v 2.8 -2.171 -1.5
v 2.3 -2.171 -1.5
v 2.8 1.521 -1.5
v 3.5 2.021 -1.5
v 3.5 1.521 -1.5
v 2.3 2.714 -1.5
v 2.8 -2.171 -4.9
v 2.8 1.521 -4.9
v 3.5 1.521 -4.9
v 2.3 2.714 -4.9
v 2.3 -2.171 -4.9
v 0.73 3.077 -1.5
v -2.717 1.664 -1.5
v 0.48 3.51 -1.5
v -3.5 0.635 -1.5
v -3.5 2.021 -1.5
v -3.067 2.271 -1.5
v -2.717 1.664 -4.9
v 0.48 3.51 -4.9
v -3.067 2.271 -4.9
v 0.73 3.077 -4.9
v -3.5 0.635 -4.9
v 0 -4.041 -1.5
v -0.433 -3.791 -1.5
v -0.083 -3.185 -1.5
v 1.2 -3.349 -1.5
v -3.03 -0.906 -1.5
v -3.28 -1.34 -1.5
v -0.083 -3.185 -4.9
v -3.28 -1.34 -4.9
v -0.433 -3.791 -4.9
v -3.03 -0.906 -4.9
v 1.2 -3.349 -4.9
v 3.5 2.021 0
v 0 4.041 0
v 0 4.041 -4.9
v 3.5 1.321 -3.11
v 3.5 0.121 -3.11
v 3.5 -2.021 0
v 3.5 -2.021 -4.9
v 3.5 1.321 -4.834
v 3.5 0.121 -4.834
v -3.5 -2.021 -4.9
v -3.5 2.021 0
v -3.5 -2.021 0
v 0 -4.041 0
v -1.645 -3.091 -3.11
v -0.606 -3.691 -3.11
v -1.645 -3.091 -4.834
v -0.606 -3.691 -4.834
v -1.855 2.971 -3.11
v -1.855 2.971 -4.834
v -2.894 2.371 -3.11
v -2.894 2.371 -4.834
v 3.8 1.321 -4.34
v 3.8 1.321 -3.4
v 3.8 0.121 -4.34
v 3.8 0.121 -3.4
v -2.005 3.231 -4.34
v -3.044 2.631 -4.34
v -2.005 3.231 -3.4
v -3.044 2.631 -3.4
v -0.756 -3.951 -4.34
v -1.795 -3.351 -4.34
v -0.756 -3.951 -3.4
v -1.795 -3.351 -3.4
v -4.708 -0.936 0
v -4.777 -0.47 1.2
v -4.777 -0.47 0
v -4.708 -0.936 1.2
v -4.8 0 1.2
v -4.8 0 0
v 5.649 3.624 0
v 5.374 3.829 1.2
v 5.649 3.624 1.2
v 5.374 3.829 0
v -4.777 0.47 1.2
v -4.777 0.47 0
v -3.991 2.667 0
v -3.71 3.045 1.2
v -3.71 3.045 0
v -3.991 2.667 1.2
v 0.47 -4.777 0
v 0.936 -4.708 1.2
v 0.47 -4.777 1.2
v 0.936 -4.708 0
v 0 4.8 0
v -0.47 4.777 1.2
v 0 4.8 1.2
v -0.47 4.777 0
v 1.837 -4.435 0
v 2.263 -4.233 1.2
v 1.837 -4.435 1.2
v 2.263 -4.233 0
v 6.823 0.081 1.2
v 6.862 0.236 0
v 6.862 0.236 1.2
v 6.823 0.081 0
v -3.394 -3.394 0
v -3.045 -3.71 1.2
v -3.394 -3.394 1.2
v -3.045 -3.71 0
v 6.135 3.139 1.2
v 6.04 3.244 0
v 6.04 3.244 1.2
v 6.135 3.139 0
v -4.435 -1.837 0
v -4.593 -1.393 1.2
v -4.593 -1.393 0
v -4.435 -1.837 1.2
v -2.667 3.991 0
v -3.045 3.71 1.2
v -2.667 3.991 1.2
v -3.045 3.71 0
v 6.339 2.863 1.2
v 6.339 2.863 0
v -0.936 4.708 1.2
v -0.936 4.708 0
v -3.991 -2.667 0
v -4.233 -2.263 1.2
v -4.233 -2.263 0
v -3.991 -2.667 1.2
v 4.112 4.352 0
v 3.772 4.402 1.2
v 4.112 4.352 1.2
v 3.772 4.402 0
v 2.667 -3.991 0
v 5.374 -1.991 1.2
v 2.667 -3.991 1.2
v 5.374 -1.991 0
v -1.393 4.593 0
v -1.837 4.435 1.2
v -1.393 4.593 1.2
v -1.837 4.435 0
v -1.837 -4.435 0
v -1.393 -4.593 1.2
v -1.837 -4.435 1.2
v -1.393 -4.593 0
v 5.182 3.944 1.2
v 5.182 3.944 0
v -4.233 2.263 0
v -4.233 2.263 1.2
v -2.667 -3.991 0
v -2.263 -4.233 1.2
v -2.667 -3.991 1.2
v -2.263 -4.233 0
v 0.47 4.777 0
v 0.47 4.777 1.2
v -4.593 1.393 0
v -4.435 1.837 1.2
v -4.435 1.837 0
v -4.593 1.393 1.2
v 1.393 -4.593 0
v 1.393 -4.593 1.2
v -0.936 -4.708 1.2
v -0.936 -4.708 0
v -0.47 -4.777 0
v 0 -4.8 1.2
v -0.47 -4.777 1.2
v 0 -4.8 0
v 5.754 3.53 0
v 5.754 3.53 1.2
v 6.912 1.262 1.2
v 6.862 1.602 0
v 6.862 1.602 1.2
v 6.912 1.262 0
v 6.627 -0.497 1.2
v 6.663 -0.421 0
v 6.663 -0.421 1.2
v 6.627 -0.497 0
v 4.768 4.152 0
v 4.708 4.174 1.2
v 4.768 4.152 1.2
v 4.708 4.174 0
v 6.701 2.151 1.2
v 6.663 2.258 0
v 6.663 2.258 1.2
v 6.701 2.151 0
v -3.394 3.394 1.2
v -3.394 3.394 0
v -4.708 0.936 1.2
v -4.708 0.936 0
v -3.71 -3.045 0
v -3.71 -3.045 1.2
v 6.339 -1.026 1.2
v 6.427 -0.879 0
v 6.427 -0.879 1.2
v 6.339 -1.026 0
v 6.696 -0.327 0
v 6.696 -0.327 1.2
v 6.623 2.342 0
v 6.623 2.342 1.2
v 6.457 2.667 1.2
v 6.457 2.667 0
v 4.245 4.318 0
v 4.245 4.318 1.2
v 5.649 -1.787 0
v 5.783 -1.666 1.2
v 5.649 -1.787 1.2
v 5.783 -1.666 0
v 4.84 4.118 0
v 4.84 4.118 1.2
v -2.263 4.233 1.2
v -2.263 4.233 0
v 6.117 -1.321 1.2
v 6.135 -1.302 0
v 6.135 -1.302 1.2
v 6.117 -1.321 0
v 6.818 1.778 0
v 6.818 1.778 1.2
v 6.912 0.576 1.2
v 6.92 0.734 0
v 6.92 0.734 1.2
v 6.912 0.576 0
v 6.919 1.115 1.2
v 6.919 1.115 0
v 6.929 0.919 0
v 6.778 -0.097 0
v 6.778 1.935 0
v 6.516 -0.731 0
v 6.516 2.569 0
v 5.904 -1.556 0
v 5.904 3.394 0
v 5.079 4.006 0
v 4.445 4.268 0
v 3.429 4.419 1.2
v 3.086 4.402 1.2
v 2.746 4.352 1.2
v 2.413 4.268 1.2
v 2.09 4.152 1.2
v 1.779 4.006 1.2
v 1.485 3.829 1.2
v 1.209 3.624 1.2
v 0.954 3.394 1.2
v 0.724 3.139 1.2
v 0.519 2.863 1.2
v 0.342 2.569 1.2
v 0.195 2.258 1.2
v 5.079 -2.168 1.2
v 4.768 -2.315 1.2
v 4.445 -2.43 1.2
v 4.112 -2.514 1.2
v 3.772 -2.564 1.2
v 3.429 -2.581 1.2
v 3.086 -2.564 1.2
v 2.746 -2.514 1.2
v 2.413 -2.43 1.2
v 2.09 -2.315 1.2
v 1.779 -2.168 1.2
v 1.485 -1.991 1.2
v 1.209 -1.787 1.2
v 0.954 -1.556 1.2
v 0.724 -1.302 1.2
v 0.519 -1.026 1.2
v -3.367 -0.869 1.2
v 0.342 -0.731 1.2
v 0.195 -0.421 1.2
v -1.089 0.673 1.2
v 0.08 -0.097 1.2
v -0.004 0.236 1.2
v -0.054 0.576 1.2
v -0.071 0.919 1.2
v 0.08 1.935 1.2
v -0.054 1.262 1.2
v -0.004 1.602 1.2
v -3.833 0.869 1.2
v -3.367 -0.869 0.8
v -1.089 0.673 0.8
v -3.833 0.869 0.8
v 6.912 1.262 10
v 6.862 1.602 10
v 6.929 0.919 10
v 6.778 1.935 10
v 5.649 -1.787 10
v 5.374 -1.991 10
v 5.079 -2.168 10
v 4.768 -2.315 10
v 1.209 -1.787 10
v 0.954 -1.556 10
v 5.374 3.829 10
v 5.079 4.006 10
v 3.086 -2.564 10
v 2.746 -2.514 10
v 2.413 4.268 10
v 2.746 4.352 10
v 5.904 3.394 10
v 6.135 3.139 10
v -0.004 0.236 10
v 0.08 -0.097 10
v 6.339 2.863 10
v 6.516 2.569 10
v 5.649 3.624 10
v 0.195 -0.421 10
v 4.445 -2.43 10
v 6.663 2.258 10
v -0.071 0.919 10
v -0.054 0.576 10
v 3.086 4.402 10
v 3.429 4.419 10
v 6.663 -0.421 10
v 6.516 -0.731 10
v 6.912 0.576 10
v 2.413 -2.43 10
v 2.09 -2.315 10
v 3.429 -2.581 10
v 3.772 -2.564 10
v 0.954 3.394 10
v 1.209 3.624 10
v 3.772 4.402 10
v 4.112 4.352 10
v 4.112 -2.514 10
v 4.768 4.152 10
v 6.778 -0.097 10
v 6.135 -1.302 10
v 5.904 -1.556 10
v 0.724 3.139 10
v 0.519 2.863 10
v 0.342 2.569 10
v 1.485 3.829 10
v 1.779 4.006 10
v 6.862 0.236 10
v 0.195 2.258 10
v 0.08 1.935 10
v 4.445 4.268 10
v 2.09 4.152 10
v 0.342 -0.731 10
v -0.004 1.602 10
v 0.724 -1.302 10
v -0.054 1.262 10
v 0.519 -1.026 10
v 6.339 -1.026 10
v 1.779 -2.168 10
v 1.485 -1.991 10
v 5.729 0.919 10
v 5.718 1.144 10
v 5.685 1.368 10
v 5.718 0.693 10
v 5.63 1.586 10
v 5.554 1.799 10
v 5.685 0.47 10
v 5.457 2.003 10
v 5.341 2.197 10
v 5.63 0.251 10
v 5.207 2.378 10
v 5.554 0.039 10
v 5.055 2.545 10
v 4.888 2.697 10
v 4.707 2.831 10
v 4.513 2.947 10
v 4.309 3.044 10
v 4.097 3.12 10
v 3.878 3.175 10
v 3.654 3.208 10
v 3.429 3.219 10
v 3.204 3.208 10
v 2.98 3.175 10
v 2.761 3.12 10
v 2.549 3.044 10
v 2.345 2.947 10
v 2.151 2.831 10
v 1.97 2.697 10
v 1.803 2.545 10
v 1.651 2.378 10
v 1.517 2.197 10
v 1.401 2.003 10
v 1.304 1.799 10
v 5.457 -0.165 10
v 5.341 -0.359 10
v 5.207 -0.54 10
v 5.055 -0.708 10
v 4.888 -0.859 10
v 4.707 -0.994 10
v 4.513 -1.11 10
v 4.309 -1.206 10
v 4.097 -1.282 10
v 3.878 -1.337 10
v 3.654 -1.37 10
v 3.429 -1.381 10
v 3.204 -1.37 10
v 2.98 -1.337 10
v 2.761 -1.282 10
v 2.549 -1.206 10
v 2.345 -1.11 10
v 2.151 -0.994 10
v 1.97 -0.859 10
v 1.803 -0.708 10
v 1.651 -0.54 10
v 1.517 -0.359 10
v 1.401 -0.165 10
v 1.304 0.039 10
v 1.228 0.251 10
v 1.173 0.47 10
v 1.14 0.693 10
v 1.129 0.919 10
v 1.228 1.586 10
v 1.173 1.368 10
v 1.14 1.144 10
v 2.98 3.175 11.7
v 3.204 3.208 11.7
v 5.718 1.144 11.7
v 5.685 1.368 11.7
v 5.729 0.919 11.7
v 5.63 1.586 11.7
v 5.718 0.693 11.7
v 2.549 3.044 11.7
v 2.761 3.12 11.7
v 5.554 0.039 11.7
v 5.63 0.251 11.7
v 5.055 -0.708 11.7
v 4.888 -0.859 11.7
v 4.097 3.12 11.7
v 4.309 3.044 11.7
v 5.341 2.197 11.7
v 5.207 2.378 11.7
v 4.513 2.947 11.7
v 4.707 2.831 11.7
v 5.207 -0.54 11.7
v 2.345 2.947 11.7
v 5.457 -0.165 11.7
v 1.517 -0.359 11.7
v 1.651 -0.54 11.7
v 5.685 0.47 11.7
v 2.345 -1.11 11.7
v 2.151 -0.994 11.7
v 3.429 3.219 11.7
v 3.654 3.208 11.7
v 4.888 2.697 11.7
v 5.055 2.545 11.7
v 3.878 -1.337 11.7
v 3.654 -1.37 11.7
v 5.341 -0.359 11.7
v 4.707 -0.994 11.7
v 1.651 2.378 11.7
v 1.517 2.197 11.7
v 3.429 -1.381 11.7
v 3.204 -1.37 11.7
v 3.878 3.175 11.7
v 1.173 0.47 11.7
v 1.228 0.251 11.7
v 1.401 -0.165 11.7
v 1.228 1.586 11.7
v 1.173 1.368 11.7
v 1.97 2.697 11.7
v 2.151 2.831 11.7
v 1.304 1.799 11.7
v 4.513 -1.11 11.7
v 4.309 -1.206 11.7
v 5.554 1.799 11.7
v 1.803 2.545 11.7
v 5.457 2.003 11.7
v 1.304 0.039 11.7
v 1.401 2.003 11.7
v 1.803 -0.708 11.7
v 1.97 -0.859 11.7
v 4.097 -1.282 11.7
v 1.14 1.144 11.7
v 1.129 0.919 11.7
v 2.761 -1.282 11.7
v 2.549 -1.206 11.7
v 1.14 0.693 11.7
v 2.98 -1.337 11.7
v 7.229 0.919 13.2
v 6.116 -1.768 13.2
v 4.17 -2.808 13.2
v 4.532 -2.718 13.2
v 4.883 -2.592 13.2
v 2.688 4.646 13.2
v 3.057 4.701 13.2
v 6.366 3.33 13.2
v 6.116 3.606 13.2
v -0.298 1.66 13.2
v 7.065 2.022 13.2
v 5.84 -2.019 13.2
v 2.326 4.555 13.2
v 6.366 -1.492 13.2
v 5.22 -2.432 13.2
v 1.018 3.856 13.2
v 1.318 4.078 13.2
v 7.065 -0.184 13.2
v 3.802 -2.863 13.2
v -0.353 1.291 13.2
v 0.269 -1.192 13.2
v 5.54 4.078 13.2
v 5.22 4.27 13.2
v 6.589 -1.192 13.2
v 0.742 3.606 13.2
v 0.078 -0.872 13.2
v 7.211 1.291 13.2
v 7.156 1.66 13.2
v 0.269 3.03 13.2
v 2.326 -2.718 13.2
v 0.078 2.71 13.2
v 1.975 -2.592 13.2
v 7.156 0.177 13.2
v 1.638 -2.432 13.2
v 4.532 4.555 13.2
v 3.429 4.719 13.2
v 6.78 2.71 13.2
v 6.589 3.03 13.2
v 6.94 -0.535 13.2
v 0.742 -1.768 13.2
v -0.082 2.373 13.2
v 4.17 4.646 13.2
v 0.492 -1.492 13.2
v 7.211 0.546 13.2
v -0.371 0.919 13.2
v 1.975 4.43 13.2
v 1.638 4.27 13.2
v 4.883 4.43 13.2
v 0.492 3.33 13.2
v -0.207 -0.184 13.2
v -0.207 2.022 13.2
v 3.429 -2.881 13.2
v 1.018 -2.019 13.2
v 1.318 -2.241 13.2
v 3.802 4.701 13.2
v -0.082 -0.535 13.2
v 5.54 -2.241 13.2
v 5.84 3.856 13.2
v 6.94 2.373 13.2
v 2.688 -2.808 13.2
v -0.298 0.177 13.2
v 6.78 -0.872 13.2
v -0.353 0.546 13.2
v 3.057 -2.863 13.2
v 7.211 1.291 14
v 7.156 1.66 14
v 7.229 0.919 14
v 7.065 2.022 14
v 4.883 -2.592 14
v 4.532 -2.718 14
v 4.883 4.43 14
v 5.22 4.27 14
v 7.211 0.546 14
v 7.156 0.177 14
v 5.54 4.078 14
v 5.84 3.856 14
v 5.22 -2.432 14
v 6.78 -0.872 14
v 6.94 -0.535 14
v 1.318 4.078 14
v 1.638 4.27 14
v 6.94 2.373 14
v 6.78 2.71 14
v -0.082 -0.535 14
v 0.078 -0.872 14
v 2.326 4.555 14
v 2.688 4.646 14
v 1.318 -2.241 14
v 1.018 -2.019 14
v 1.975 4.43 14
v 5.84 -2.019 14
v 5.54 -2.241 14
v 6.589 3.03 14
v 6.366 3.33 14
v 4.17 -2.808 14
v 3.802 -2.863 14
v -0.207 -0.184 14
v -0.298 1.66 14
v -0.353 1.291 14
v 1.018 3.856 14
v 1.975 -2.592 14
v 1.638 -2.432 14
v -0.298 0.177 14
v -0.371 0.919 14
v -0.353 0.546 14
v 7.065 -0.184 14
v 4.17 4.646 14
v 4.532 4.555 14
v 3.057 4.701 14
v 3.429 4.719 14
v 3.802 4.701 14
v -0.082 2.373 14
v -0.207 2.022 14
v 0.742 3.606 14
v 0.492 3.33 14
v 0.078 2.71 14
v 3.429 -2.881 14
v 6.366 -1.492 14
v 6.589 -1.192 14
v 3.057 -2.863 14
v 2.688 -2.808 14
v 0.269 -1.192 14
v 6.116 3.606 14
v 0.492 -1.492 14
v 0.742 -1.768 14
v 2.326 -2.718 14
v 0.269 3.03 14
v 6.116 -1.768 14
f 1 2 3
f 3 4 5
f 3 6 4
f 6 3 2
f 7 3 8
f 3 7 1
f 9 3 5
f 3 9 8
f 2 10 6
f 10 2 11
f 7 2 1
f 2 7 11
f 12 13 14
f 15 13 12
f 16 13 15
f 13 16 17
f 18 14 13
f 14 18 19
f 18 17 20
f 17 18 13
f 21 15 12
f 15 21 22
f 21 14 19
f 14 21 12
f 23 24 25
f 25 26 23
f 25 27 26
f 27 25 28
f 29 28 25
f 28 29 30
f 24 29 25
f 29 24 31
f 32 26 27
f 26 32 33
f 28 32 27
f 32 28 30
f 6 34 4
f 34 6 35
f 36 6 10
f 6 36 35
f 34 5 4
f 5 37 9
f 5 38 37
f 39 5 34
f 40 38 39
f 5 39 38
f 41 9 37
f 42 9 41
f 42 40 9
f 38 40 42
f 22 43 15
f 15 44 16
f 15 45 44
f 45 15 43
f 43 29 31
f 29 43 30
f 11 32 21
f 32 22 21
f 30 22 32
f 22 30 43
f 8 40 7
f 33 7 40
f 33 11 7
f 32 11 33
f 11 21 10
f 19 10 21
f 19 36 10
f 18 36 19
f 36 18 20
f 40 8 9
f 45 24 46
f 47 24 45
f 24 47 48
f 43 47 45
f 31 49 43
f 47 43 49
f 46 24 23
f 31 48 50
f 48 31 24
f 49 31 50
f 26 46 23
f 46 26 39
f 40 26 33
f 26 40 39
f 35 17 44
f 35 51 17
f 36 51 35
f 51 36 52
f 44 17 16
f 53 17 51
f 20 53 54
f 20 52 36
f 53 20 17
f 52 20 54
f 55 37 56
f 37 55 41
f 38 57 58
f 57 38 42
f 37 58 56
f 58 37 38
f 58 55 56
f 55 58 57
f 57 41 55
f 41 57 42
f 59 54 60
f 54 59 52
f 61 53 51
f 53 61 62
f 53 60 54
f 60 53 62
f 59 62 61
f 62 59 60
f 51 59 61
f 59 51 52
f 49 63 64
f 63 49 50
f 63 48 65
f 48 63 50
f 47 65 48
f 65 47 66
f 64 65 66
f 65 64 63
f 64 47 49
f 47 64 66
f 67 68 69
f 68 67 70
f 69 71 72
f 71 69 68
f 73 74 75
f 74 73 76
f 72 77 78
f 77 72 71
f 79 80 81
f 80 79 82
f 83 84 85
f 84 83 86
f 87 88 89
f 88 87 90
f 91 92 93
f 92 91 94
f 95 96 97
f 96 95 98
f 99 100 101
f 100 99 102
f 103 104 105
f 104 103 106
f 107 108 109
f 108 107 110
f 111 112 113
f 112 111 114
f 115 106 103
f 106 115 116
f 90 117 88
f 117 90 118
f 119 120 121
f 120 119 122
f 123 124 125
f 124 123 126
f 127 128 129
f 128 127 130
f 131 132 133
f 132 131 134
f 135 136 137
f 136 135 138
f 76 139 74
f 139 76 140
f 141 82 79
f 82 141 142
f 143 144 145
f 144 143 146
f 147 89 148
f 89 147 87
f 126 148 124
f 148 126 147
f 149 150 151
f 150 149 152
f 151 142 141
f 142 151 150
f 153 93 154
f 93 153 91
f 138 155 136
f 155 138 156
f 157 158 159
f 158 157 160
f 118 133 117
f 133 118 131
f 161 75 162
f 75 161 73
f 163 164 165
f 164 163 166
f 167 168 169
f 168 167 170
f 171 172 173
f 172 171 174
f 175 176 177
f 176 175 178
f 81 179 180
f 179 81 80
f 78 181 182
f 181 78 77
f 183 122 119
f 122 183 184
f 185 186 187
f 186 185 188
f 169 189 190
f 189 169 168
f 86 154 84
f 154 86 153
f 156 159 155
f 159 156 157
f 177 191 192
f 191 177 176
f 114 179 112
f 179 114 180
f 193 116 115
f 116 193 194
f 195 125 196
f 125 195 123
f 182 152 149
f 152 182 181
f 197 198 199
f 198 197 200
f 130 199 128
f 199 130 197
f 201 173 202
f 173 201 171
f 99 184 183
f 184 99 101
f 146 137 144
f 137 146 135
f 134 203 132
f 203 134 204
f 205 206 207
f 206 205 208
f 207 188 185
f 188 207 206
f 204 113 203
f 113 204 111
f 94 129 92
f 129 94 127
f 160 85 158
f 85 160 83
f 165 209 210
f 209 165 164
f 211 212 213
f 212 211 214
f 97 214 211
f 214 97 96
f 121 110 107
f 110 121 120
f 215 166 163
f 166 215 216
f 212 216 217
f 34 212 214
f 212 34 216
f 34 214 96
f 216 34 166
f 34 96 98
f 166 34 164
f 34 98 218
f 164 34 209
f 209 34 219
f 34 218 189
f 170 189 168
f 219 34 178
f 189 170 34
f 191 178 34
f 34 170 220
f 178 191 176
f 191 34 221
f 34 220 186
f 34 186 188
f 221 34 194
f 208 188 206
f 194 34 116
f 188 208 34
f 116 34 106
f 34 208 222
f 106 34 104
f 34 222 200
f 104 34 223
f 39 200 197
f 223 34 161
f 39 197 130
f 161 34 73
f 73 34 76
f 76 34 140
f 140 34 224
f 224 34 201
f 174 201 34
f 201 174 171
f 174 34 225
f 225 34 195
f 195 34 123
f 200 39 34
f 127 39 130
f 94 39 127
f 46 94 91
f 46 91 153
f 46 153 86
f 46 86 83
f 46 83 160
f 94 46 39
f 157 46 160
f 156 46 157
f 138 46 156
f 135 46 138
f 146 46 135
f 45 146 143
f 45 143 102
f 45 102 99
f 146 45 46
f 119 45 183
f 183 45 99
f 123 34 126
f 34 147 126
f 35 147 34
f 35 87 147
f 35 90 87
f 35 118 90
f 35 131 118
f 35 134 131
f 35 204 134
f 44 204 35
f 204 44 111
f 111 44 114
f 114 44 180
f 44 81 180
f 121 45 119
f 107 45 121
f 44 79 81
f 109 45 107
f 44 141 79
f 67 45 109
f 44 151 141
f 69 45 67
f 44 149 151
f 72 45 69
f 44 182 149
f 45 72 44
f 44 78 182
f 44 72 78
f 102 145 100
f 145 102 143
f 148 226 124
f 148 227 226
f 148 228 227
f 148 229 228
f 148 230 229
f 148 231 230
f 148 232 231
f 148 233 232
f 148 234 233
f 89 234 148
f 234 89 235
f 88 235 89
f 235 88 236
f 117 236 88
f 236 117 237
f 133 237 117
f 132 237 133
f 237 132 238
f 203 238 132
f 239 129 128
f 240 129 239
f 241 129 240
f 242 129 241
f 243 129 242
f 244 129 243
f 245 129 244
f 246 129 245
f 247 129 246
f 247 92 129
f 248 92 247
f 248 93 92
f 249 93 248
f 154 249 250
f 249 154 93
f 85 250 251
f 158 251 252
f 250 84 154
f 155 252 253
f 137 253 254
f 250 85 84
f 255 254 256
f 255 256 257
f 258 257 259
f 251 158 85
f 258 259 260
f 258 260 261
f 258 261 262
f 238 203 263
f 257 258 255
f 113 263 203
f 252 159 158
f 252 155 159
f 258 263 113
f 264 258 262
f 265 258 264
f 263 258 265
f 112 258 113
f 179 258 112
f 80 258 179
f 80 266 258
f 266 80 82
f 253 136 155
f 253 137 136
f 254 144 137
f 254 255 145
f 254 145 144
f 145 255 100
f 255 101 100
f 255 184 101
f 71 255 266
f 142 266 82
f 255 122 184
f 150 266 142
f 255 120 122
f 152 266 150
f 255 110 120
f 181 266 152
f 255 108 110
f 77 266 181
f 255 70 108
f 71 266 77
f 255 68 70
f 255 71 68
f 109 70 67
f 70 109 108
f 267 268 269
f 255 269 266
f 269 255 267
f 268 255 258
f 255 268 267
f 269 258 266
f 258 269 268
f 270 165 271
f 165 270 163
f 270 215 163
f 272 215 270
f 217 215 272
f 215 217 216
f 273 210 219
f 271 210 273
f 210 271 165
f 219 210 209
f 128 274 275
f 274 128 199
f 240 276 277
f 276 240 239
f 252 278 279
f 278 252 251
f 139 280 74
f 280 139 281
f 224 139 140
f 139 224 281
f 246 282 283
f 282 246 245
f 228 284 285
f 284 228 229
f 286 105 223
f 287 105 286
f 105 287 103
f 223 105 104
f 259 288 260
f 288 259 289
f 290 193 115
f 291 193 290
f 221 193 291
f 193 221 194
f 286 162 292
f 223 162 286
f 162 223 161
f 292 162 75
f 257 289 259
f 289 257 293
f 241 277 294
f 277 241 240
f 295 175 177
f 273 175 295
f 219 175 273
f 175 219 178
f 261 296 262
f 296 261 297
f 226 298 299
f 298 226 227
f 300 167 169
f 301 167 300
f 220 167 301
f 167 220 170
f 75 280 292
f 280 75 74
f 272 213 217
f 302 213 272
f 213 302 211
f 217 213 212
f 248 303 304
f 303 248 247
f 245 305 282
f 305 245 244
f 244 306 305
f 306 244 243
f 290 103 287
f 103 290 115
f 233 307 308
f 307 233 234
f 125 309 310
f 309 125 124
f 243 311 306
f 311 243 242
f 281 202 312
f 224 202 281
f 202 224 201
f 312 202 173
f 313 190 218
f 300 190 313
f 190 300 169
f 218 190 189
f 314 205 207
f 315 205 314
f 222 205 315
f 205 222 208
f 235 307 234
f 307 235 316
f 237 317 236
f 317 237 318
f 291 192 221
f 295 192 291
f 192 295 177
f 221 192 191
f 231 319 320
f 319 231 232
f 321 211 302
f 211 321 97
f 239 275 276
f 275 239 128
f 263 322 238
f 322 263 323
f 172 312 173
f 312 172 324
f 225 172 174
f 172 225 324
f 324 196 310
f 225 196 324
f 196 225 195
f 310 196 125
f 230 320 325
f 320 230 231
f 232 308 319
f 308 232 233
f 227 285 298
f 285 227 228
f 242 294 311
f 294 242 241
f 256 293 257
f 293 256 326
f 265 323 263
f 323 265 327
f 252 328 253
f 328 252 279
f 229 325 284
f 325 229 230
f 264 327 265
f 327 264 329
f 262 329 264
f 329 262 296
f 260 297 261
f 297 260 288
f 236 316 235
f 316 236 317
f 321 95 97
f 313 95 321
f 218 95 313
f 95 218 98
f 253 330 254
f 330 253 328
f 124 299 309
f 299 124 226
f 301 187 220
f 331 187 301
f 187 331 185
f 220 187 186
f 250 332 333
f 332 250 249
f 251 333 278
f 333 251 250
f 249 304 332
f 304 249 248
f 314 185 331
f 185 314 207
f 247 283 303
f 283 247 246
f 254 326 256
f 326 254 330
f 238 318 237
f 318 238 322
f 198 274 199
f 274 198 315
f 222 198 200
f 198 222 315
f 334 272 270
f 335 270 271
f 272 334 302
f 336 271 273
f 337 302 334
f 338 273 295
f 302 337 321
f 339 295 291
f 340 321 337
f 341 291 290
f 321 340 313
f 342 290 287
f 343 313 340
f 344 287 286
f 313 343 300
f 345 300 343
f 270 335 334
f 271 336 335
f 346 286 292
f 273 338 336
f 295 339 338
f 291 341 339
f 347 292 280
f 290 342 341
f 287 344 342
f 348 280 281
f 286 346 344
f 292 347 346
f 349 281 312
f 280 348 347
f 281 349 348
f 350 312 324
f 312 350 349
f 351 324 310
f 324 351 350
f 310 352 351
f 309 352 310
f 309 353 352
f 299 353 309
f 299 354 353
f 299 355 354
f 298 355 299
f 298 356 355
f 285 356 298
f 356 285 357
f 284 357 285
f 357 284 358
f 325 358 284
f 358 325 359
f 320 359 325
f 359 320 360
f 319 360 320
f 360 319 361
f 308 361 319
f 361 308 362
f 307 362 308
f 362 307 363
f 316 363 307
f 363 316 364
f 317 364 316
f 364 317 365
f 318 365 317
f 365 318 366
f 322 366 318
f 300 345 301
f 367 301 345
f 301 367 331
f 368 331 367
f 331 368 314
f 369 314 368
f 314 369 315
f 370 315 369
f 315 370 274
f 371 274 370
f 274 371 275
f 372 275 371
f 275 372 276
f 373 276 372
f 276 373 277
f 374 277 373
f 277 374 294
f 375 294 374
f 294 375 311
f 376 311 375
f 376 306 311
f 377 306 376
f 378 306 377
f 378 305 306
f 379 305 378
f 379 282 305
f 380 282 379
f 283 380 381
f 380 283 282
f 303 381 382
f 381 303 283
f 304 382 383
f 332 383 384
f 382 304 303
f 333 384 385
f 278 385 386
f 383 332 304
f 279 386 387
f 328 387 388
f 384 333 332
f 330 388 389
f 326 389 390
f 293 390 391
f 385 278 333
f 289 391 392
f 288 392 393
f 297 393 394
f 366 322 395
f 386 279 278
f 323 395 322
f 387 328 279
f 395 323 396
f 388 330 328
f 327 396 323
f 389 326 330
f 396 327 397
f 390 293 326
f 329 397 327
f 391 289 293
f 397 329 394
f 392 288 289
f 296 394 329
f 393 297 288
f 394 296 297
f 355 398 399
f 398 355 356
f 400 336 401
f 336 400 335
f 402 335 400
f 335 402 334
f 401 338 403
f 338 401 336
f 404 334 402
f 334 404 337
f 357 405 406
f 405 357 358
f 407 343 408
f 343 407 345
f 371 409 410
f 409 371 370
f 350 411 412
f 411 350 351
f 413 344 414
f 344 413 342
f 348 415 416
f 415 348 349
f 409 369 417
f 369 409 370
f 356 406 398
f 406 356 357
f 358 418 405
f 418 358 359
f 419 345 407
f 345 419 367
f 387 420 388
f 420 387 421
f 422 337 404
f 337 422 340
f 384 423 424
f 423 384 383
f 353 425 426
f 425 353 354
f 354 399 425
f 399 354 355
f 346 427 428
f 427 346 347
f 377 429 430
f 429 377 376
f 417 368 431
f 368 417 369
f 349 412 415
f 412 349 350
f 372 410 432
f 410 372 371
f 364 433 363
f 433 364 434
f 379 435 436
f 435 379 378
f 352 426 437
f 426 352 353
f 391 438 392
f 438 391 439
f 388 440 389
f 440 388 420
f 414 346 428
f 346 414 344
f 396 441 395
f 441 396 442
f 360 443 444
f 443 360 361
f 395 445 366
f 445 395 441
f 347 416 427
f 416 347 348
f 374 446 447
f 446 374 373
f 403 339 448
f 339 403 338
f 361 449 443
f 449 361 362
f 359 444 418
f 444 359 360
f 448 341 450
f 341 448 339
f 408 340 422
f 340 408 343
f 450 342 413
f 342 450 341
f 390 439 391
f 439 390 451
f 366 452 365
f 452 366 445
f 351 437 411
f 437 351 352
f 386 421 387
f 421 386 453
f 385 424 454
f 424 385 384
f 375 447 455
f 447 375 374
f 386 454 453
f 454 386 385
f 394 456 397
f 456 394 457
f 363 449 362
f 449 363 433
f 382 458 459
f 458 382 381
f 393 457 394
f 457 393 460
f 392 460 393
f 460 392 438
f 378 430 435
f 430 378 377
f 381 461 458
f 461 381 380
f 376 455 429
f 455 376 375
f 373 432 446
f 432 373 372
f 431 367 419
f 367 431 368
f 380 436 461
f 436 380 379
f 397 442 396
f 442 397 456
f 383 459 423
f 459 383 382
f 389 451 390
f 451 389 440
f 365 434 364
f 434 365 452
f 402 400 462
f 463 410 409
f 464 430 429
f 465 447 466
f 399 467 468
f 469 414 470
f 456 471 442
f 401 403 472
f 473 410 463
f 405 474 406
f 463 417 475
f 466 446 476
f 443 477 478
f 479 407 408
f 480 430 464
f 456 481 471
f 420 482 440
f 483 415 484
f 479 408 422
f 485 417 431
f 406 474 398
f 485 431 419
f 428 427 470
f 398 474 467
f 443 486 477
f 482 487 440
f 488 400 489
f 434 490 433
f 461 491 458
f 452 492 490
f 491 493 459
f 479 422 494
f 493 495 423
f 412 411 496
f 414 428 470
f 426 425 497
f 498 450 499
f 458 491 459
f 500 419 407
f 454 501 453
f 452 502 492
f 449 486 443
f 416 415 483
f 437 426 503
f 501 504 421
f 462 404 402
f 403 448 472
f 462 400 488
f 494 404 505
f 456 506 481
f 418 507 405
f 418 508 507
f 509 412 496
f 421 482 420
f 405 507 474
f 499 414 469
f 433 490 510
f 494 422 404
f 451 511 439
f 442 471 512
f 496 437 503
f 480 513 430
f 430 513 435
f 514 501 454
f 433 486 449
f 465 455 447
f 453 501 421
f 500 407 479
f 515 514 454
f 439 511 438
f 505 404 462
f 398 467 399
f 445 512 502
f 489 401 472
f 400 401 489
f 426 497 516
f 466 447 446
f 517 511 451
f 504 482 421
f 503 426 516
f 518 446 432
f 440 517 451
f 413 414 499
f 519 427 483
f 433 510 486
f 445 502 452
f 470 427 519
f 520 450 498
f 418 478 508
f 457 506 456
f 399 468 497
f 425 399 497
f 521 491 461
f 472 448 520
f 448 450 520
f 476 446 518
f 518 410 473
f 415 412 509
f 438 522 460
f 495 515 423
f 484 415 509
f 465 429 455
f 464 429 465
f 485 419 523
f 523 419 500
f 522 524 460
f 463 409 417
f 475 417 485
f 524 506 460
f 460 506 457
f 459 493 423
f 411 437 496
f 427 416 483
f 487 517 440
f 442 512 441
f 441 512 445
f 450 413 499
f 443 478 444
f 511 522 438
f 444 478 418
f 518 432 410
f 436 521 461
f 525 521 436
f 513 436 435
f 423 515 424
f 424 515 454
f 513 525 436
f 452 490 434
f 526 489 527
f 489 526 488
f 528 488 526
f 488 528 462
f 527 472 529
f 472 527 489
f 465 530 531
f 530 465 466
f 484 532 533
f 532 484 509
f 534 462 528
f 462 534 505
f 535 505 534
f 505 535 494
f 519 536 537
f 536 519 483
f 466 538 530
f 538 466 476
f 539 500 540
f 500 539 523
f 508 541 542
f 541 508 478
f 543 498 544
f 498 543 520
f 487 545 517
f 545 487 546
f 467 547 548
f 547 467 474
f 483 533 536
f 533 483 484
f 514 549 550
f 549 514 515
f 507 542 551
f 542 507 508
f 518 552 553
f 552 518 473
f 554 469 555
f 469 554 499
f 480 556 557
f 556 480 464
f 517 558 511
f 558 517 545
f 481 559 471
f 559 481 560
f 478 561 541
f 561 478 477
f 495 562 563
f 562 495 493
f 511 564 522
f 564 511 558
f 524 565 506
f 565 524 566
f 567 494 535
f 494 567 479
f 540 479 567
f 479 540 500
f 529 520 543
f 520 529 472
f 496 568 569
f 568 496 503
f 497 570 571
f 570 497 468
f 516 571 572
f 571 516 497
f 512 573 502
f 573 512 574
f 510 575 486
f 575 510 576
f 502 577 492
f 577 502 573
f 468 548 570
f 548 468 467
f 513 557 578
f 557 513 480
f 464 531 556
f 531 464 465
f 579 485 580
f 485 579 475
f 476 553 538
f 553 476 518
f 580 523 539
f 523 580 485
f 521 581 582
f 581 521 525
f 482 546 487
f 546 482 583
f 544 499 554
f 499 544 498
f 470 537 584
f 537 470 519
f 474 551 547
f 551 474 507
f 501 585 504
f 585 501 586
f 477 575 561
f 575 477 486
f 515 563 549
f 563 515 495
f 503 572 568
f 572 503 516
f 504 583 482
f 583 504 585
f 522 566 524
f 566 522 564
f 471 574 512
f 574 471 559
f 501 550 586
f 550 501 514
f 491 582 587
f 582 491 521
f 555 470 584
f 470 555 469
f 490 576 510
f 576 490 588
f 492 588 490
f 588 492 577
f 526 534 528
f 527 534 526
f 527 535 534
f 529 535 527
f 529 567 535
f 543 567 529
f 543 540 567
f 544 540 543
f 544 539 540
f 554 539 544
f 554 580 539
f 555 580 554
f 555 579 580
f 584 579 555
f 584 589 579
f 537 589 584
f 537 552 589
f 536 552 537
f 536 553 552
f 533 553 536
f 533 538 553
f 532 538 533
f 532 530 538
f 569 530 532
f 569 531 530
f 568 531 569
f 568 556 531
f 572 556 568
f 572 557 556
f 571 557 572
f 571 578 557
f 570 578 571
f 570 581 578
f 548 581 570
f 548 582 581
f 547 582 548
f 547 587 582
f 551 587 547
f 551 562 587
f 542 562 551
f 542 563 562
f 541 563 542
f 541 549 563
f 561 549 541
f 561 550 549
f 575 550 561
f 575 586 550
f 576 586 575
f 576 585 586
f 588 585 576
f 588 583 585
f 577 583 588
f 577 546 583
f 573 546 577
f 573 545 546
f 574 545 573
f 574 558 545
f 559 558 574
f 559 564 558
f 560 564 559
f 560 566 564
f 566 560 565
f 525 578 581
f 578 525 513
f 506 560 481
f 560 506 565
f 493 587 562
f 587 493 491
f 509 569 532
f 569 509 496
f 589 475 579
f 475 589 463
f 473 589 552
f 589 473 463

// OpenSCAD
// file: ../generated/config.scad
// GENERATED by tools/build.py from config/rack.yaml — do not edit.

FRAME_W = 670.6;
FRAME_D = 225.335;
FRAME_TILT = 20;
FRAME_ROW_Y0 = 25;
FRAME_BASE_H = 80;
FRAME_TOP_Z = 410;
FRAME_PANEL_T = 7.4;
FRAME_PANEL_CLEAR = 0.2;
ROW_IDS = ["A", "B"];
ROW_HEIGHTS = [165, 165];
ROW_LAYOUTS = [[1, 1, 1, 1], [1, 1, 1, 1]];
BAY_PITCH = 165.8;
CARRIER_W = 158;
CARRIER_D = 210;
CARRIER_BOTTOM = 2.5;
CARRIER_WALL = 2;
CARRIER_STANDOFF = 5;
CARRIER_DECK = 3;
CARRIER_FASCIA = 2.5;
CARRIER_WALL_H = 20.1;
CARRIER_PLENUM = 23.1;
PCB_TO_FLOOR = 14;
CAM_MOUNT = [109, 45, 30];
CAM_LENS = [64, 27.6];
DRAWER_D = 208;
DRAWER_W = 142;
DRAWER_X0 = 8;
DRAWER_TRAVEL = 140;
DRAWER_GUIDE_W = 7.5;
DRAWER_CLEAR = 0.5;
DRAWER_BOTTOM = 2.5;
DRAWER_WALL = 2;
DRAWER_WALL_H = 16;
DRAWER_FRONT_H = 30;
DRAWER_FRONT_T = 4;
DRAWER_REAR_BAY = 42;
DRAWER_FLANGE = [3, 3];
DRAWER_MAGNET = [6, 3];
DATA_PORT_X = [80];
PLATE_T = 5;
HEX_PITCH = 10;
HEX_AF = 7.2;
HEX_U = 0.4;
HEX_CLEAR = 0.1;
HEX_HOLES = [[23.7, 10.418], [33.7, 10.418], [43.7, 10.418], [53.7, 10.418], [63.7, 10.418], [73.7, 10.418], [83.7, 10.418], [93.7, 10.418], [103.7, 10.418], [113.7, 10.418], [123.7, 10.418], [8.7, 19.078], [18.7, 19.078], [28.7, 19.078], [38.7, 19.078], [48.7, 19.078], [58.7, 19.078], [68.7, 19.078], [78.7, 19.078], [88.7, 19.078], [98.7, 19.078], [108.7, 19.078], [118.7, 19.078], [128.7, 19.078], [13.7, 27.738], [23.7, 27.738], [33.7, 27.738], [43.7, 27.738], [53.7, 27.738], [63.7, 27.738], [73.7, 27.738], [83.7, 27.738], [93.7, 27.738], [103.7, 27.738], [113.7, 27.738], [123.7, 27.738], [8.7, 36.399], [18.7, 36.399], [28.7, 36.399], [38.7, 36.399], [48.7, 36.399], [58.7, 36.399], [68.7, 36.399], [78.7, 36.399], [88.7, 36.399], [98.7, 36.399], [108.7, 36.399], [118.7, 36.399], [128.7, 36.399], [13.7, 45.059], [23.7, 45.059], [33.7, 45.059], [43.7, 45.059], [53.7, 45.059], [63.7, 45.059], [73.7, 45.059], [83.7, 45.059], [93.7, 45.059], [103.7, 45.059], [113.7, 45.059], [123.7, 45.059], [8.7, 53.719], [18.7, 53.719], [28.7, 53.719], [38.7, 53.719], [48.7, 53.719], [58.7, 53.719], [68.7, 53.719], [78.7, 53.719], [88.7, 53.719], [98.7, 53.719], [108.7, 53.719], [118.7, 53.719], [128.7, 53.719], [23.7, 62.379], [33.7, 62.379], [43.7, 62.379], [53.7, 62.379], [63.7, 62.379], [73.7, 62.379], [83.7, 62.379], [93.7, 62.379], [103.7, 62.379], [113.7, 62.379], [123.7, 62.379], [28.7, 71.04], [38.7, 71.04], [48.7, 71.04], [58.7, 71.04], [68.7, 71.04], [78.7, 71.04], [88.7, 71.04], [98.7, 71.04], [108.7, 71.04], [33.7, 79.7], [43.7, 79.7], [53.7, 79.7], [63.7, 79.7], [73.7, 79.7], [83.7, 79.7], [93.7, 79.7], [103.7, 79.7], [28.7, 88.36], [38.7, 88.36], [48.7, 88.36], [58.7, 88.36], [68.7, 88.36], [78.7, 88.36], [88.7, 88.36], [98.7, 88.36], [108.7, 88.36], [13.7, 97.021], [23.7, 97.021], [33.7, 97.021], [43.7, 97.021], [53.7, 97.021], [63.7, 97.021], [73.7, 97.021], [83.7, 97.021], [93.7, 97.021], [103.7, 97.021], [113.7, 97.021], [123.7, 97.021], [8.7, 105.681], [18.7, 105.681], [28.7, 105.681], [38.7, 105.681], [48.7, 105.681], [58.7, 105.681], [68.7, 105.681], [78.7, 105.681], [88.7, 105.681], [98.7, 105.681], [108.7, 105.681], [118.7, 105.681], [128.7, 105.681], [13.7, 114.341], [23.7, 114.341], [33.7, 114.341], [43.7, 114.341], [53.7, 114.341], [63.7, 114.341], [73.7, 114.341], [83.7, 114.341], [93.7, 114.341], [103.7, 114.341], [113.7, 114.341], [123.7, 114.341], [8.7, 123.001], [18.7, 123.001], [28.7, 123.001], [38.7, 123.001], [48.7, 123.001], [58.7, 123.001], [68.7, 123.001], [78.7, 123.001], [88.7, 123.001], [98.7, 123.001], [108.7, 123.001], [118.7, 123.001], [128.7, 123.001], [13.7, 131.662], [23.7, 131.662], [33.7, 131.662], [43.7, 131.662], [53.7, 131.662], [63.7, 131.662], [73.7, 131.662], [83.7, 131.662], [93.7, 131.662], [103.7, 131.662], [113.7, 131.662], [123.7, 131.662], [8.7, 140.322], [18.7, 140.322], [28.7, 140.322], [38.7, 140.322], [48.7, 140.322], [58.7, 140.322], [68.7, 140.322], [78.7, 140.322], [88.7, 140.322], [98.7, 140.322], [108.7, 140.322], [118.7, 140.322], [128.7, 140.322], [13.7, 148.982], [23.7, 148.982], [33.7, 148.982], [43.7, 148.982], [53.7, 148.982], [63.7, 148.982], [73.7, 148.982], [83.7, 148.982], [93.7, 148.982], [103.7, 148.982], [113.7, 148.982]];
HEX_ROWS = [[1, 10.418], [2, 19.078], [3, 27.738], [4, 36.399], [5, 45.059], [6, 53.719], [7, 62.379], [8, 71.04], [9, 79.7], [10, 88.36], [11, 97.021], [12, 105.681], [13, 114.341], [14, 123.001], [15, 131.662], [16, 140.322], [17, 148.982]];
PEG_STOP = [3.55, 15, 4.6, 7, 7.6];
PEG_CAM = [3, 6.75, 270, 20];
CHAIN_INNER = [7, 7];
CHAIN_OUTER = [13.5, 10.2];
CHAIN_R = 18;
CHAIN_PITCH = 16;
CHAIN_END_HOLES = [8, 4];
CHAIN_FIXED = [100, 87];
CHAIN_MOVING_X = 136;
CHAIN_FOOT_Y = 172;
CHAIN_MOVING_Y = 157;
CHAIN_END_LENGTH = 26;
CHAIN_BEND_Y = 183;
NODE_SIZE = [74, 90];
NODE_T = 1.6;
NODE_HOLES = [[3.5, 13.5], [70.5, 13.5], [3.5, 86.5], [70.5, 86.5]];
NODE_X0 = 4;
NODE_FRONT_Y = 3;
NODE_PCB_TOP = 9.1;
NODE_FRONT = [32, 12, 50];
NODE_PWR_Y = 73;
NODE_DATA_Y = 30;
NODE_AUX = [69.1, 50.6];
NODE_CAM = [59, 17.2];
DATA_PCB_SIZE = [40, 17];
DATA_PCB_T = 1.6;
DATA_PCB_HOLES = [[2.6, 13.5], [37.5, 4]];
DATA_PCB_USB = 30.5;
DATA_PCB_PH = 14.4;
DATA_X4_SIZE = [100, 37];
DATA_X4_X0 = 15;
DATA_X4_HOLES = [[3.2, 16.5], [38.7, 16.5], [81.4, 16.3]];
DATA_X4_USB = [11, 29, 47, 65];
DATA_X4_LEAD = [95.1, 20];
POD_PCB_SIZE = [40, 27];
POD_PCB_T = 1.6;
POD_PCB_HOLES = [[2.6, 13], [26.5, 23.5]];
POD_LEDS = [5, 11, 17, 23];
POD_LED_Y = 3.2;
POD_LEAD_Y = 13;
POD_HEADER = [13, 21];
HUB_SIZE = [76, 100];
HUB_HOLES = [[3.5, 3.5], [72, 4], [4, 93.5], [72, 86]];
HUB_T = 1.6;
HUB_X0 = 3.6;
HUB_FRONT_GAP = 1.2;
HUB_Z = 19;
HUB_ROWS = [81, 63.5, 46, 28.5];
HUB_LEDS = [11, 23, 35, 47, 55.6, 61.6];
HUB_USB = 70;
HUB_PD = 62;
HUB_BUTTONS = [[11.5, 10], [11.5, 16.5]];
PBOX_COLUMN = 0;
PBOX_SIZE = [84, 108, 35];
PBOX_WALL = 2.4;
PBOX_X = 3;
// file: ../lib/common.scad
// Shared helpers for every printed part of hw-testing-rack.
include <../generated/config.scad>

$fn = $preview ? 32 : 64;
EPS = 0.01;

// Heat-set inserts (Ruthex-style).  Hole Ø is the recommended pre-hole.
INSERT_M3 = [4.0, 5.7];    // [hole Ø, depth]
INSERT_M2 = [3.2, 4.0];
INSERT_M25 = [3.6, 4.5];
M3_CLEAR = 3.4;
M5_CLEAR = 5.5;
M3_HEAD = [6.0, 3.0];      // DIN 912 / ISO 7380 head Ø × height (button head ~5.7)

module rbox(size, r = 2, center = false) {
    // Box with rounded vertical edges.
    translate(center ? [-size[0] / 2, -size[1] / 2, 0] : [0, 0, 0])
        hull() for (x = [r, size[0] - r], y = [r, size[1] - r])
            translate([x, y, 0]) cylinder(r = r, h = size[2]);
}

module rslot(len, w, h) {
    // Stadium-shaped slot along X, centred on the origin.
    hull() for (x = [-(len - w) / 2, (len - w) / 2]) translate([x, 0, 0]) cylinder(d = w, h = h);
}

module insert_hole(spec = INSERT_M3) {
    // Pocket for a heat-set insert, opening at z=0 and going -Z.
    translate([0, 0, -spec[1]]) cylinder(d = spec[0], h = spec[1] + EPS);
    translate([0, 0, -0.6]) cylinder(d1 = spec[0], d2 = spec[0] + 0.8, h = 0.6 + EPS);
}

module screw_through(d = M3_CLEAR, h = 20, head = M3_HEAD, counterbore = true) {
    // Clearance hole along +Z from z=0, with an optional counterbore at z=h.
    translate([0, 0, -EPS]) cylinder(d = d, h = h + 2 * EPS);
    if (counterbore) translate([0, 0, h - head[1]]) cylinder(d = head[0] + 0.4, h = head[1] + EPS);
}

module magnet_pocket(d = DRAWER_MAGNET[0], t = DRAWER_MAGNET[1]) {
    // Slip-fit pocket for a glued disc magnet (docs/mechanical.md), opening at z=0 going -Z.
    translate([0, 0, -t - 0.2]) cylinder(d = d + 0.25, h = t + 0.2 + EPS);
}

module label_text(txt, size = 6, depth = 0.6, font = "Liberation Sans:style=Bold") {
    linear_extrude(depth) text(txt, size = size, font = font, halign = "center", valign = "center");
}
// file: ../lib/hexgrid.scad
// The board plate's honeycomb and the plug every peg clips into it with (config/rack.yaml › plate_grid,
// generated/config.scad › HEX_*, PEG_*).  The clip stays inside the plate: a hole is HEX_AF across flats
// at its waist, wider by HEX_U per side over its bottom HEX_UNDER_H, with a 45° ledge between the two; a
// peg's plug has three spring skins (openGrid-style: each a cantilever along one flat, freed by a slot, so
// it bends in the print plane, not across layers) whose nubs snap under that ledge.  Nothing comes out
// under the plate: the drawer's floor, its magnet and the drag chain below never see a peg.
include <common.scad>

HEX_UNDER_H = 1.4;                  // the undercut's height, from the plate's bottom
HEX_LEADIN = 0.4;                   // the top edge's 45° lead-in
PLUG_AF = HEX_AF - 2 * HEX_CLEAR;   // a plug across flats
PLUG_L = PLUG_AF / sqrt(3);         // one of its flats
SKIN = 0.7;                         // a spring skin's thickness
SKIN_SLOT = 0.5;                    // the slot behind it
SKIN_H = 3.4;                       // the spring zone, from the plug's bottom up
SKIN_ROOT = 0.15;                   // the slot runs this far past the flat's corner: 3.7 free, 1.5 % (printed-parts-review)
NUB = 0.3;                          // a nub's reach past its flat: 0.2 over the waist going in, 0.2 under the ledge
FLANGE = [9.6, 1.2];                // the plug's flange on the plate's top: Ø, thickness
PCB_T = 1.6;                        // the boards' thickness the lips and cams are cut for

// stop and pin: the post's offset from the plug's axis, at `angle` from a flat's normal; 6 turns
STOP_E = PEG_STOP[0];
STOP_A = PEG_STOP[1];
NECK_D = PEG_STOP[2];
LEDGE_D = PEG_STOP[3];
LIP_D = PEG_STOP[4];
function stop_offset() = STOP_E * [cos(STOP_A), sin(STOP_A)];

function hexpts(af) = [for (k = [0:5]) let (a = 90 + 60 * k) (af / sqrt(3)) * [cos(a), sin(a)]];
module hex2d(af) polygon(hexpts(af));          // flats facing ±X (and ±60°), corners ±Y

// one hole's cutter, z = 0 on the plate's bottom
module hex_hole(t = PLATE_T) {
    translate([0, 0, -1]) linear_extrude(HEX_UNDER_H + 1) hex2d(HEX_AF + 2 * HEX_U);
    hull() {                                    // the 45° ledge the nubs catch
        translate([0, 0, HEX_UNDER_H - EPS]) linear_extrude(EPS) hex2d(HEX_AF + 2 * HEX_U);
        translate([0, 0, HEX_UNDER_H + HEX_U]) linear_extrude(EPS) hex2d(HEX_AF);
    }
    translate([0, 0, HEX_UNDER_H]) linear_extrude(t) hex2d(HEX_AF);
    hull() {                                    // lead-in
        translate([0, 0, t - HEX_LEADIN]) linear_extrude(EPS) hex2d(HEX_AF);
        translate([0, 0, t]) linear_extrude(1) hex2d(HEX_AF + 2 * HEX_LEADIN);
    }
}

// a peg's plug, z = 0 on the plate's top (the flange sits there), going down to 0.1 above the plate's bottom
module peg_plug() {
    z0 = -PLATE_T + 0.1;
    difference() {
        translate([0, 0, z0]) linear_extrude(PLATE_T - 0.1 + EPS) hex2d(PLUG_AF);
        // three skins, on the flats at 0°, 120°, 240°: a slot behind each, open at its free end, run to the
        // flat's far corner (and SKIN_ROOT past it: the plug's next flat still closes it)
        for (k = [0, 2, 4]) rotate(60 * k) translate([0, 0, z0 - 1]) linear_extrude(SKIN_H + 1) {
            translate([PLUG_AF / 2 - SKIN - SKIN_SLOT, -PLUG_L / 2 - SKIN_ROOT]) square([SKIN_SLOT, PLUG_L + SKIN_ROOT]);
            translate([PLUG_AF / 2 - SKIN - SKIN_SLOT, PLUG_L / 2 - SKIN_SLOT]) square([SKIN + SKIN_SLOT + 1, 2]);
        }
    }
    // the nubs, near each skin's free end: a 30° lead-in below, and a 45° top on the hole's ledge when the
    // flange sits on the plate (the ledge's foot at zl, its face 1:1; the nub's corner HEX_U + HEX_CLEAR
    // - NUB inside the undercut's wall, so that much above the foot)
    zl = -PLATE_T + HEX_UNDER_H;
    za = zl + HEX_U + HEX_CLEAR - NUB;
    for (k = [0, 2, 4]) rotate(60 * k) translate([PLUG_AF / 2, PLUG_L / 2 - SKIN_SLOT - 0.8, 0])
        rotate([90, 0, 0]) linear_extrude(1.2, center = true)
            polygon([[-EPS, z0 + 0.05], [NUB, z0 + 0.05 + NUB * 1.7], [NUB, za], [-EPS, za + NUB]]);
}

module peg_flange(extra = undef) {              // on the plate's top; `extra`: a second circle to hull with
    linear_extrude(FLANGE[1]) hull() {
        circle(d = FLANGE[0]);
        if (extra != undef) translate(extra[0]) circle(d = extra[1]);
    }
}
// main file
// Clip-in pegs for the honeycomb board plate (lib/hexgrid.scad; tools/plate_layout.py places them).
//
//   openscad -D 'PART="stop"' -D H=12 -o peg_stop_h12.stl parts/pegs.scad
//
// The stops place a board, the cams clamp it:
//   stop    an eccentric post on the plug (6 turns = 6 places in each hole): its ledge carries the PCB's
//           edge, its neck touches the edge, the 45° cone above (the lip) holds it down.  The plate's
//           layout says which turn (an arrow on the flange points to the post).  One stop between two
//           boards side by side holds both.
//   base    the cam's pivot: a column up to the PCB's underside less the cam's flange, a split pin
//   cam     on the base: a spiral (3 mm of travel), its band undercut 20° so that it presses the PCB's top
//           edge down as it closes, its flange under the edge.  Clockwise (seen from above) closes it;
//           further, it falls open.  Self-locking: the spiral rises less than friction holds
//   pin     an eccentric pin through one of the board's mounting holes, on a pad as wide as the hole's
//           copper ring (6 turns, like the stop): for a board whose edges are lined with headers
//   bobbin  the DUT cable's spare length loops round it, under its cap
// H: the board's standoff (plate top → PCB underside, boards.yaml › standoff); HOLE: a pin's hole Ø.
// Print: upright, flange down (the cam: flange down), PETG, 0.2 mm, no support; every overhang ≤ 45°
// but the flange's 1 mm rim.
include <../lib/hexgrid.scad>

PART = "stop";
H = 10;
HOLE = 3.2;
$fn = $preview ? 32 : 64;

CAM = PEG_CAM;                          // spiral r0 → r1 over arc°, its band's undercut (°)
CAM_FLANGE = 1.0;                       // under the PCB's edge
CAM_BAND = 2.0;                         // PCB_T + 0.4
CAM_GRIP = [11, 3.0, 1.8];              // the bar to turn it by
PIVOT_D = 3.4;                          // the base's pin, the cam's bore 3.6
PIVOT_HEAD = [3.9, 0.8];                // its snap head: Ø, height (0.15 over the cam's 3.6 bore each side)
PIVOT_SPLIT = 6.5;                      // the split's depth from the head's underside: through a relief
PIVOT_RELIEF = [4.4, 2];                // in the column's top (Ø, depth), so each half bends 0.15 at 0.7 %
CAM_RISE = 3.6;                         // the head's underside above the cam's own bottom
function spiral(r0, r1, arc, off = 0) = [for (k = [0:72]) let (t = arc * k / 72) (r0 + (r1 - r0) * k / 72 + off) * [cos(t), sin(t)]];

module arrow(l = 2.6, w = 1.8, h = 0.4) {   // engraved/raised mark, pointing +X
    linear_extrude(h) polygon([[0, -w / 2], [l, 0], [0, w / 2]]);
}

module stop(h) {
    o = stop_offset();
    peg_plug();
    difference() {
        peg_flange([o, LEDGE_D]);
        translate([-3.6, 0, FLANGE[1] - 0.4]) rotate(STOP_A) arrow();   // engraved: points to the post
    }
    translate(o) {
        cylinder(d = LEDGE_D, h = h);                                      // the ledge: the PCB rests on it
        cylinder(d = NECK_D, h = h + PCB_T + 0.1);                          // the neck: the PCB's edge touches it
        translate([0, 0, h + PCB_T + 0.1]) cylinder(d1 = NECK_D, d2 = LIP_D, h = (LIP_D - NECK_D) / 2);   // 45° lip
        translate([0, 0, h + PCB_T + 0.1 + (LIP_D - NECK_D) / 2]) cylinder(d = LIP_D, h = 0.8);
    }
}

module base(h) {
    peg_plug();
    peg_flange();
    difference() {
        cylinder(d1 = 8.5, d2 = 7.0, h = h - CAM_FLANGE);
        translate([0, 0, h - CAM_FLANGE - PIVOT_RELIEF[1]]) cylinder(d = PIVOT_RELIEF[0], h = PIVOT_RELIEF[1] + 1);
    }
    // the pivot: split so that its head snaps through the cam's bore (the halves bend across the layers)
    difference() {
        union() {
            cylinder(d = PIVOT_D, h = h - CAM_FLANGE + CAM_RISE);
            translate([0, 0, h - CAM_FLANGE + CAM_RISE]) cylinder(d1 = PIVOT_HEAD[0], d2 = PIVOT_D - 0.6, h = PIVOT_HEAD[1]);
        }
        translate([-0.4, -PIVOT_RELIEF[0] / 2, h - CAM_FLANGE + CAM_RISE - PIVOT_SPLIT]) cube([0.8, PIVOT_RELIEF[0], 10]);
    }
}

module cam() {      // z = 0 on its flange's underside (the base's top)
    r0 = CAM[0]; r1 = CAM[1]; arc = CAM[2];
    grow = CAM_BAND * tan(CAM[3]);
    difference() {
        union() {
            linear_extrude(CAM_FLANGE) offset(r = 1.2) polygon(spiral(r0, r1, arc));
            translate([0, 0, CAM_FLANGE]) hull() {
                linear_extrude(EPS) polygon(spiral(r0, r1, arc));
                translate([0, 0, CAM_BAND]) linear_extrude(EPS) polygon(spiral(r0, r1, arc, grow));
            }
            translate([0, 0, CAM_FLANGE + CAM_BAND]) linear_extrude(CAM_GRIP[2])
                offset(r = 0.8) offset(delta = -0.8) square([CAM_GRIP[0], CAM_GRIP[1]], center = true);
        }
        translate([0, 0, -1]) cylinder(d = PIVOT_D + 0.2, h = 10);
        translate([0, 0, CAM_RISE - 0.1]) cylinder(d = PIVOT_HEAD[0] + 0.7, h = 3);      // the head's seat
        // "close" arrow on the grip: clockwise seen from above
        translate([CAM_GRIP[0] / 2 - 3.2, 0, CAM_FLANGE + CAM_BAND + CAM_GRIP[2] - 0.4]) rotate(-90) arrow(2.0, 1.6, 0.4 + EPS);
    }
}

module pin(h, hole) {
    o = stop_offset();
    pad = hole + 2.6;                                                      // ≈ a mounting hole's copper ring
    peg_plug();
    difference() {
        peg_flange([o, pad + 0.5]);
        translate([-3.6, 0, FLANGE[1] - 0.4]) rotate(STOP_A) arrow();
    }
    translate(o) {
        cylinder(d1 = pad + 1.5, d2 = pad, h = h);
        cylinder(d = hole - 0.3, h = h + PCB_T + 1.2);
        translate([0, 0, h + PCB_T + 1.2]) cylinder(d1 = hole - 0.3, d2 = hole - 1.1, h = 0.4);
    }
}

module bobbin() {
    peg_plug();
    peg_flange();
    translate([0, 0, FLANGE[1]]) cylinder(d1 = 9.6, d2 = 7, h = 1.3);         // flared foot
    cylinder(d = 7, h = 10);
    translate([0, 0, 10]) cylinder(d1 = 7, d2 = 15, h = 4);                   // 45° under the cap: no support
    translate([0, 0, 14]) cylinder(d = 15, h = 1.2);
    translate([0, 0, 15.2]) cylinder(d1 = 15, d2 = 13.8, h = 0.6);
}

if (PART == "stop") stop(H);
if (PART == "base") base(H);
if (PART == "cam") cam();
if (PART == "pin") pin(H, HOLE);
if (PART == "bobbin") bobbin();
